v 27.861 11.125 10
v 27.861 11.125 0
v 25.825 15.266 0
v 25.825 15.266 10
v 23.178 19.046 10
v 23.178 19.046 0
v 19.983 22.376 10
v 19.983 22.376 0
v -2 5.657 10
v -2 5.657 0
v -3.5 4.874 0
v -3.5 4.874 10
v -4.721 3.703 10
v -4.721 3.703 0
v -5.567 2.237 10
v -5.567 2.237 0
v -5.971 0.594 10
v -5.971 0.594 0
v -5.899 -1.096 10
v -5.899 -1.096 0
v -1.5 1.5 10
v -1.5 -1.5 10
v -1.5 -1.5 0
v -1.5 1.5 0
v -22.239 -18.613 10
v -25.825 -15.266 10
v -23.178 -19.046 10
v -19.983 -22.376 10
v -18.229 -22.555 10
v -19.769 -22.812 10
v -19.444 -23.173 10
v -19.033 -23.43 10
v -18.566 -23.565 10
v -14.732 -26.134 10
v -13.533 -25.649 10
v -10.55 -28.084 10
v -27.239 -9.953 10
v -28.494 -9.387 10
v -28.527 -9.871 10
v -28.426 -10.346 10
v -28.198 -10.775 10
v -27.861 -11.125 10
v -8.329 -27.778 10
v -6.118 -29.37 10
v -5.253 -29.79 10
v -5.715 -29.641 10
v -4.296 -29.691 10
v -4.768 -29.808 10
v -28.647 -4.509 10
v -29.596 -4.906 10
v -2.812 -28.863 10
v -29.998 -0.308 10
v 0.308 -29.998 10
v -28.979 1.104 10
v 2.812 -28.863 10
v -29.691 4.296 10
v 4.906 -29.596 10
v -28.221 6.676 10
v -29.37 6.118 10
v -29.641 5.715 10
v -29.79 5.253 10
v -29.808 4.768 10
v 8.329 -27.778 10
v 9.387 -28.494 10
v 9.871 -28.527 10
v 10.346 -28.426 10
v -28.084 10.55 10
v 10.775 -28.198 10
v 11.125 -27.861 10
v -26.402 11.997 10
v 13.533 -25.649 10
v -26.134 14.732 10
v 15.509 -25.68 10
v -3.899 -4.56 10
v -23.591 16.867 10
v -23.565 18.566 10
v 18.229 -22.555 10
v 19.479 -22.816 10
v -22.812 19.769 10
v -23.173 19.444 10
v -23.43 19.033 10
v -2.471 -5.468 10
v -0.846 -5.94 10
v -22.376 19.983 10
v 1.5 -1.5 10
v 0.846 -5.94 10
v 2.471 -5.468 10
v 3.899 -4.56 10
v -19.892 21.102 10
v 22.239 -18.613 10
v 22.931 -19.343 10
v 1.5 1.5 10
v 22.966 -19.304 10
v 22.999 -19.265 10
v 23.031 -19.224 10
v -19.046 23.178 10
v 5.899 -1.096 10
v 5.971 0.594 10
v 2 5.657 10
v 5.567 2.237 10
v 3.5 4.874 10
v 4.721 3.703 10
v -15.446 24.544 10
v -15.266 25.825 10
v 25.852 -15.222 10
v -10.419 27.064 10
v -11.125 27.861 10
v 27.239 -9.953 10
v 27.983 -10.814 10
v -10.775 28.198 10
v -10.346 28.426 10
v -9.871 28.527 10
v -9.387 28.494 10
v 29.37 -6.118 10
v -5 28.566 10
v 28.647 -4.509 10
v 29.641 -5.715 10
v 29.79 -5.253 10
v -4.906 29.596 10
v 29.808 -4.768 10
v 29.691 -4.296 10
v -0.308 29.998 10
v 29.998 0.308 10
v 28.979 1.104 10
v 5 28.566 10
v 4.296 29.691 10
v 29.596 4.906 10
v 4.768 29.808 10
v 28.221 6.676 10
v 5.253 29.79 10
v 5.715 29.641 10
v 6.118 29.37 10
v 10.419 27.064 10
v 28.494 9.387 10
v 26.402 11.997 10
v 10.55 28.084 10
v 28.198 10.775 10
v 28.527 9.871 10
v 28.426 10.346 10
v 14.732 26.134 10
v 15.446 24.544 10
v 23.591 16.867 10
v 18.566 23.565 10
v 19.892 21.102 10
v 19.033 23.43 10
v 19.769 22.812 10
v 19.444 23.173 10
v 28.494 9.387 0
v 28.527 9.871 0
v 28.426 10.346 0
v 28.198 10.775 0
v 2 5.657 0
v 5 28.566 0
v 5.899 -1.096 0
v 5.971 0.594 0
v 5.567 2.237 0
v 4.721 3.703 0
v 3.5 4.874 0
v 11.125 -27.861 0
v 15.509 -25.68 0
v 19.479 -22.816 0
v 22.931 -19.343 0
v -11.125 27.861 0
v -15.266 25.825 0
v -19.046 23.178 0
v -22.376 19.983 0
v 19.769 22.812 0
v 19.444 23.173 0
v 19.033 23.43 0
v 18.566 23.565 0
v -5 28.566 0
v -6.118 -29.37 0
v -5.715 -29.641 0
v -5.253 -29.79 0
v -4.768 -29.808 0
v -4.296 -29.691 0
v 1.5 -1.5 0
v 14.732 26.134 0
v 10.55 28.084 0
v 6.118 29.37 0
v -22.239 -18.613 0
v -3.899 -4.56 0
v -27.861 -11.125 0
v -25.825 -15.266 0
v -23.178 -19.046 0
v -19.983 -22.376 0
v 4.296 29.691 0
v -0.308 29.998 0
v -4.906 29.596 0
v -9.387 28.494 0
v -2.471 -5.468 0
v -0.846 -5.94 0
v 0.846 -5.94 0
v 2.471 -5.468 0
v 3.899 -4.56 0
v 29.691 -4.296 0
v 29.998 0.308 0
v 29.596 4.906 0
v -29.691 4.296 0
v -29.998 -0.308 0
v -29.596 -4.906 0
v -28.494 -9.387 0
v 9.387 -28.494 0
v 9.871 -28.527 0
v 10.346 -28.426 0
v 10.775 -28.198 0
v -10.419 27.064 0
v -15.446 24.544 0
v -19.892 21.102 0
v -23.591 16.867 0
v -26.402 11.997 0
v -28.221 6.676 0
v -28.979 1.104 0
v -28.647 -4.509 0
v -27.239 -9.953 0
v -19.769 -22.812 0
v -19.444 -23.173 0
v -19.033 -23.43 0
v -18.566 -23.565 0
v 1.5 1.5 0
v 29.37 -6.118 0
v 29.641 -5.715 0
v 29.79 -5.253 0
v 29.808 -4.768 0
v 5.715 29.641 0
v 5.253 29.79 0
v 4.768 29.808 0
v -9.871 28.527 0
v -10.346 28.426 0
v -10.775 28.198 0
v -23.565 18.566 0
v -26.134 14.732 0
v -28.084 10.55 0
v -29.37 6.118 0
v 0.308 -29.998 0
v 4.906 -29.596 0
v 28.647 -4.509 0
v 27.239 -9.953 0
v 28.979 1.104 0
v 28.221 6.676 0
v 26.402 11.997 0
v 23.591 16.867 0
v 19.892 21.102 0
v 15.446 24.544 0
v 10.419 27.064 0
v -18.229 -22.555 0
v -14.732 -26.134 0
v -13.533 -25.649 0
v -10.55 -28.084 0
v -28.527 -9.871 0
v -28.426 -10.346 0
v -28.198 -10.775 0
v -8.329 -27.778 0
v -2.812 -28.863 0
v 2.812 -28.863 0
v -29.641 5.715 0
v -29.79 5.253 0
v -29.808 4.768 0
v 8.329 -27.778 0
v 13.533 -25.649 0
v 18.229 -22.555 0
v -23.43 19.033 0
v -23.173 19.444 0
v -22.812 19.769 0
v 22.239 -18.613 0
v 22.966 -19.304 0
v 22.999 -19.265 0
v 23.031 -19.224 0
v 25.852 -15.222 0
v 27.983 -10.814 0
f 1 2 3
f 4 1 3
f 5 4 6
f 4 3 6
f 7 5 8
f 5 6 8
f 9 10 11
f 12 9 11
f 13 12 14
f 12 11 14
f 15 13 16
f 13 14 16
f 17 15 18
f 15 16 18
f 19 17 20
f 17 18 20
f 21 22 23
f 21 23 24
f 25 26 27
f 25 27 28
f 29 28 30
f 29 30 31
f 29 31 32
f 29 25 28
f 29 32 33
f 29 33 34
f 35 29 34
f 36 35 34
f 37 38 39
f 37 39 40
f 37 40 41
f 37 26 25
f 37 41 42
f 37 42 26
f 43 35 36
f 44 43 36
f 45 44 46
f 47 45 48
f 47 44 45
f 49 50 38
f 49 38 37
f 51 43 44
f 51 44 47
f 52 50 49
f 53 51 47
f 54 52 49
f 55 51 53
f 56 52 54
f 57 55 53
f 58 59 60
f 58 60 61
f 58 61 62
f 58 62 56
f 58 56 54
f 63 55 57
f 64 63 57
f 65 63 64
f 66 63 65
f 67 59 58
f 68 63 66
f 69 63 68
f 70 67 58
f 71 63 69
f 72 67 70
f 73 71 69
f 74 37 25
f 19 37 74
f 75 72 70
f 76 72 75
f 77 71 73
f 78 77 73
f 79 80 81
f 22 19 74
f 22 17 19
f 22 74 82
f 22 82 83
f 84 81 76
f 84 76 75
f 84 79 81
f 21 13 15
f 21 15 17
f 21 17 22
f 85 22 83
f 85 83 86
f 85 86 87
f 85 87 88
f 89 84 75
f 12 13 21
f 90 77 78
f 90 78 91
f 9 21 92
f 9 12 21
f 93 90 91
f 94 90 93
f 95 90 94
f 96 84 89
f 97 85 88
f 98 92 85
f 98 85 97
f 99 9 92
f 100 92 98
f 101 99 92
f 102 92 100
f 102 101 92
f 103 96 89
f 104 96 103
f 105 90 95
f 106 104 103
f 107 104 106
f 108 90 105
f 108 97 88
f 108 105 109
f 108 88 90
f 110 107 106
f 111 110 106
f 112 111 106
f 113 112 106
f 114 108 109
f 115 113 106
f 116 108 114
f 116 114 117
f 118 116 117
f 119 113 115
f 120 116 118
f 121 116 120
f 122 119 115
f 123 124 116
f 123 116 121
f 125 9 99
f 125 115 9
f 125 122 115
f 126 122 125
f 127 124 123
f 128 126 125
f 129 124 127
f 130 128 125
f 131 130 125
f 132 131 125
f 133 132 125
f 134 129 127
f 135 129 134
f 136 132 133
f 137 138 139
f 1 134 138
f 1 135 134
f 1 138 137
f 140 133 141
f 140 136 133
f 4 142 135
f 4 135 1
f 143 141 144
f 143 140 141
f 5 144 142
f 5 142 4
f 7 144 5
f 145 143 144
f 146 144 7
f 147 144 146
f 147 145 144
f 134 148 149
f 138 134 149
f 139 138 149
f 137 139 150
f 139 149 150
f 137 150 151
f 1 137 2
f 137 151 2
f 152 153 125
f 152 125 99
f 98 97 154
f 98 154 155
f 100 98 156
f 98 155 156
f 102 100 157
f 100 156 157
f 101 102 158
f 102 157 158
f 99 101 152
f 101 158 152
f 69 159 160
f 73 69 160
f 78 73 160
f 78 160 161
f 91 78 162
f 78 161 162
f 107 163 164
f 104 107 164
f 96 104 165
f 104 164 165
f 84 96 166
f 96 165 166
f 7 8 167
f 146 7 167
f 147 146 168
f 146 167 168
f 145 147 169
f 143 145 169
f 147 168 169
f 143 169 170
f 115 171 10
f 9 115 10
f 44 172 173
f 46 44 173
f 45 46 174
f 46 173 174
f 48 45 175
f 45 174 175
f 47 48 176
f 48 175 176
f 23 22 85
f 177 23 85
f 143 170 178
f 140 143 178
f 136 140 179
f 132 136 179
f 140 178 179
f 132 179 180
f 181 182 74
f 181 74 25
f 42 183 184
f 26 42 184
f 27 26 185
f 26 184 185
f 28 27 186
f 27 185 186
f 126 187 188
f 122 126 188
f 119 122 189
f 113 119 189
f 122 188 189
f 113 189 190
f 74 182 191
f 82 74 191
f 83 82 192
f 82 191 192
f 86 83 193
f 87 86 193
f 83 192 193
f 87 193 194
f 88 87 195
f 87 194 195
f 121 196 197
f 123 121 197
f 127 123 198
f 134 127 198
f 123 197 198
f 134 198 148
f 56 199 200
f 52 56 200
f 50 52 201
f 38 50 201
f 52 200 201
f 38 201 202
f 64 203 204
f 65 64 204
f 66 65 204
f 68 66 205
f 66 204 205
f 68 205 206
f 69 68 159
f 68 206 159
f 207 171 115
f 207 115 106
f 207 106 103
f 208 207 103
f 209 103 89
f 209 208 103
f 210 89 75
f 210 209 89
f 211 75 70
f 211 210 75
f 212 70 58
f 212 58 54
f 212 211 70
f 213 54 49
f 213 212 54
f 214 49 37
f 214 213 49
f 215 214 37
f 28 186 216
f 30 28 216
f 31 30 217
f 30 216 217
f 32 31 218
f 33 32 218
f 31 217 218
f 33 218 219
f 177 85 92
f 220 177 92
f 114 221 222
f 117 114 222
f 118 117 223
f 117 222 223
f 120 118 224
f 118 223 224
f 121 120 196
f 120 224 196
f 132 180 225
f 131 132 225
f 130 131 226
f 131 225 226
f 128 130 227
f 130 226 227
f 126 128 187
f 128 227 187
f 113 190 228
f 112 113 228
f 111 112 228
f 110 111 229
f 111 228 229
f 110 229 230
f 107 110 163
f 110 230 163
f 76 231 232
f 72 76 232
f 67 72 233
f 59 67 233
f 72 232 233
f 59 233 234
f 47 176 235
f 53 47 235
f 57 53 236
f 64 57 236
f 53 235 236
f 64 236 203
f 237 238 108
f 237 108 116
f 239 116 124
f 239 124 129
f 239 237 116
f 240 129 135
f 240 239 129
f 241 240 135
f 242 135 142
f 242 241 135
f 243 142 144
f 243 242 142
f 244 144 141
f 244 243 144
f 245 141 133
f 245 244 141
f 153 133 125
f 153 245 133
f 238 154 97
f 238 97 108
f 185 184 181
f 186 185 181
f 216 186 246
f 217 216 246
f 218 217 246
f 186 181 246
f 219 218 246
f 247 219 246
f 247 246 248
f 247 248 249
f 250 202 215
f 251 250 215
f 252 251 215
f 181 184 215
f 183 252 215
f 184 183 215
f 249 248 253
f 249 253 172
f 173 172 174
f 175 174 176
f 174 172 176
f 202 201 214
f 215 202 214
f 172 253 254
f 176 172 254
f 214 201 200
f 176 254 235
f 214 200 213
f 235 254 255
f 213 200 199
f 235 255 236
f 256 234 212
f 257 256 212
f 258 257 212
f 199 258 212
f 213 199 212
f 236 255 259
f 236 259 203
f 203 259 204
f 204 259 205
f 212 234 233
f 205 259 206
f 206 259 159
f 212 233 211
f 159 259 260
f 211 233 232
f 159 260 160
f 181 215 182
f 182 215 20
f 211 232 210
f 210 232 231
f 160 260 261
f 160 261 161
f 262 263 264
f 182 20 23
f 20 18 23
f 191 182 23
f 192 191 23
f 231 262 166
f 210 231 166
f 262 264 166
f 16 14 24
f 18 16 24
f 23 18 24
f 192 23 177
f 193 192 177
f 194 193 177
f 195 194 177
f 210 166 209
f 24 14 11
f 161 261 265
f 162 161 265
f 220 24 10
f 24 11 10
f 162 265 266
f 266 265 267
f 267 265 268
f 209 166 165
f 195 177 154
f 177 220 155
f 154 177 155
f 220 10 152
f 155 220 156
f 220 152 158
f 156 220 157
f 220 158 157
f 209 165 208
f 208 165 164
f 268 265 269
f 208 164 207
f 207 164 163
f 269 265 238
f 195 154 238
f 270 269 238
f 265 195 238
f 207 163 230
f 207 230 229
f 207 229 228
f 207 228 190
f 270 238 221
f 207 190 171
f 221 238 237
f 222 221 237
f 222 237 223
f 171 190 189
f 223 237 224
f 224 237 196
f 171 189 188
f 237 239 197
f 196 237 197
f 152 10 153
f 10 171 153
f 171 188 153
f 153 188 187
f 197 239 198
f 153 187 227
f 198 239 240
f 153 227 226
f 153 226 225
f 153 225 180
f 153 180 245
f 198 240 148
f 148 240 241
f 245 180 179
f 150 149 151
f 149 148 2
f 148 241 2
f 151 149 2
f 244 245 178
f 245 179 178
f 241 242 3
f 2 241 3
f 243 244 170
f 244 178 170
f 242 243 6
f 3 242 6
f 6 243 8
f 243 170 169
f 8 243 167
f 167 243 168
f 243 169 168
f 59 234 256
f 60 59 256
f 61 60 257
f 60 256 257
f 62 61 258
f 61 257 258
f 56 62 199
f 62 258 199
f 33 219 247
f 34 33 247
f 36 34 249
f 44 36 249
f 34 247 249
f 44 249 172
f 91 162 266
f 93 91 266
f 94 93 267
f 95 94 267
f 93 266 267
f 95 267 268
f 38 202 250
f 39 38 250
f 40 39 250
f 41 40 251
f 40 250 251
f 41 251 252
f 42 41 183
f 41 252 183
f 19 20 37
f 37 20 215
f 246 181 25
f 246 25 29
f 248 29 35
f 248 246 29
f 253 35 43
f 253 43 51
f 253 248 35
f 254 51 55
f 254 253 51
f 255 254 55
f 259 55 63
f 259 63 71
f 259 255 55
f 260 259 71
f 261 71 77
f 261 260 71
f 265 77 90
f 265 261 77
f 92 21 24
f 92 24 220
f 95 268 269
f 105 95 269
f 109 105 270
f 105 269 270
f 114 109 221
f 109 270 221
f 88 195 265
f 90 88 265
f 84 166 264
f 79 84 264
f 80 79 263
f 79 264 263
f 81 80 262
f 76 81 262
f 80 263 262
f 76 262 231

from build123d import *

# Parameters (mm, degrees)
SKETCH_W  = 3
SKETCH_H  = 3
PAD_DEPTH = 10


with BuildPart() as part:
    # Sketch → Pad (new body)
    with BuildSketch(Plane.XY):
        with BuildLine():
            ThreePointArc((29.690766, -4.296324), (29.885841, 2.614672), (28.493648, 9.3868))
            ThreePointArc((28.493648, 9.3868), (28.425702, 10.346109), (27.86112, 11.124658))
            ThreePointArc((27.86112, 11.124658), (24.574561, 17.207293), (19.982823, 22.376032))
            ThreePointArc((19.982823, 22.376032), (19.444325, 23.172844), (18.566109, 23.564796))
            ThreePointArc((18.566109, 23.564796), (12.678548, 27.189234), (6.117616, 29.369623))
            ThreePointArc((6.117616, 29.369623), (5.252857, 29.790435), (4.296324, 29.690766))
            ThreePointArc((4.296324, 29.690766), (-2.614672, 29.885841), (-9.3868, 28.493648))
            ThreePointArc((-9.3868, 28.493648), (-10.346109, 28.425702), (-11.124658, 27.86112))
            ThreePointArc((-11.124658, 27.86112), (-17.207293, 24.574561), (-22.376032, 19.982823))
            ThreePointArc((-22.376032, 19.982823), (-23.172844, 19.444325), (-23.564796, 18.566109))
            ThreePointArc((-23.564796, 18.566109), (-27.189234, 12.678548), (-29.369623, 6.117616))
            ThreePointArc((-29.369623, 6.117616), (-29.790435, 5.252857), (-29.690766, 4.296324))
            ThreePointArc((-29.690766, 4.296324), (-29.885841, -2.614672), (-28.493648, -9.3868))
            ThreePointArc((-28.493648, -9.3868), (-28.425702, -10.346109), (-27.86112, -11.124658))
            ThreePointArc((-27.86112, -11.124658), (-24.574561, -17.207293), (-19.982823, -22.376032))
            ThreePointArc((-19.982823, -22.376032), (-19.444325, -23.172844), (-18.566109, -23.564796))
            ThreePointArc((-18.566109, -23.564796), (-12.678548, -27.189234), (-6.117616, -29.369623))
            ThreePointArc((-6.117616, -29.369623), (-5.252857, -29.790435), (-4.296324, -29.690766))
            ThreePointArc((-4.296324, -29.690766), (2.614672, -29.885841), (9.3868, -28.493648))
            ThreePointArc((9.3868, -28.493648), (10.346109, -28.425702), (11.124658, -27.86112))
            ThreePointArc((11.124658, -27.86112), (17.552516, -24.329184), (22.931281, -19.343122))
            ThreePointArc((22.931281, -19.343122), (22.98258, -19.284674), (23.031232, -19.224005))
            ThreePointArc((23.031232, -19.224005), (27.007531, -13.061135), (29.369623, -6.117616))
            ThreePointArc((29.369623, -6.117616), (29.790435, -5.252857), (29.690766, -4.296324))
        make_face()
        with BuildLine():
            ThreePointArc((27.238634, -9.95273), (25.114737, 14.5), (5, 28.565714))
            Line((5, 28.565714), (2, 5.656854))
            ThreePointArc((5.898979, -1.096376), (5.196152, 3), (2, 5.656854))
            Line((5.898979, -1.096376), (27.238634, -9.95273))
        make_face(mode=Mode.SUBTRACT)
        with BuildLine():
            ThreePointArc((-22.238634, -18.612984), (0, -29), (22.238634, -18.612984))
            Line((3.898979, -4.560478), (22.238634, -18.612984))
            ThreePointArc((-3.898979, -4.560478), (0, -6), (3.898979, -4.560478))
            Line((-3.898979, -4.560478), (-22.238634, -18.612984))
        make_face(mode=Mode.SUBTRACT)
        with BuildLine():
            ThreePointArc((-5, 28.565714), (-25.114737, 14.5), (-27.238634, -9.95273))
            Line((-5.898979, -1.096376), (-27.238634, -9.95273))
            ThreePointArc((-2, 5.656854), (-5.196152, 3), (-5.898979, -1.096376))
            Line((-5, 28.565714), (-2, 5.656854))
        make_face(mode=Mode.SUBTRACT)
        Rectangle(SKETCH_W, SKETCH_H, mode=Mode.SUBTRACT)
    extrude(amount=PAD_DEPTH)


solid = part.part
